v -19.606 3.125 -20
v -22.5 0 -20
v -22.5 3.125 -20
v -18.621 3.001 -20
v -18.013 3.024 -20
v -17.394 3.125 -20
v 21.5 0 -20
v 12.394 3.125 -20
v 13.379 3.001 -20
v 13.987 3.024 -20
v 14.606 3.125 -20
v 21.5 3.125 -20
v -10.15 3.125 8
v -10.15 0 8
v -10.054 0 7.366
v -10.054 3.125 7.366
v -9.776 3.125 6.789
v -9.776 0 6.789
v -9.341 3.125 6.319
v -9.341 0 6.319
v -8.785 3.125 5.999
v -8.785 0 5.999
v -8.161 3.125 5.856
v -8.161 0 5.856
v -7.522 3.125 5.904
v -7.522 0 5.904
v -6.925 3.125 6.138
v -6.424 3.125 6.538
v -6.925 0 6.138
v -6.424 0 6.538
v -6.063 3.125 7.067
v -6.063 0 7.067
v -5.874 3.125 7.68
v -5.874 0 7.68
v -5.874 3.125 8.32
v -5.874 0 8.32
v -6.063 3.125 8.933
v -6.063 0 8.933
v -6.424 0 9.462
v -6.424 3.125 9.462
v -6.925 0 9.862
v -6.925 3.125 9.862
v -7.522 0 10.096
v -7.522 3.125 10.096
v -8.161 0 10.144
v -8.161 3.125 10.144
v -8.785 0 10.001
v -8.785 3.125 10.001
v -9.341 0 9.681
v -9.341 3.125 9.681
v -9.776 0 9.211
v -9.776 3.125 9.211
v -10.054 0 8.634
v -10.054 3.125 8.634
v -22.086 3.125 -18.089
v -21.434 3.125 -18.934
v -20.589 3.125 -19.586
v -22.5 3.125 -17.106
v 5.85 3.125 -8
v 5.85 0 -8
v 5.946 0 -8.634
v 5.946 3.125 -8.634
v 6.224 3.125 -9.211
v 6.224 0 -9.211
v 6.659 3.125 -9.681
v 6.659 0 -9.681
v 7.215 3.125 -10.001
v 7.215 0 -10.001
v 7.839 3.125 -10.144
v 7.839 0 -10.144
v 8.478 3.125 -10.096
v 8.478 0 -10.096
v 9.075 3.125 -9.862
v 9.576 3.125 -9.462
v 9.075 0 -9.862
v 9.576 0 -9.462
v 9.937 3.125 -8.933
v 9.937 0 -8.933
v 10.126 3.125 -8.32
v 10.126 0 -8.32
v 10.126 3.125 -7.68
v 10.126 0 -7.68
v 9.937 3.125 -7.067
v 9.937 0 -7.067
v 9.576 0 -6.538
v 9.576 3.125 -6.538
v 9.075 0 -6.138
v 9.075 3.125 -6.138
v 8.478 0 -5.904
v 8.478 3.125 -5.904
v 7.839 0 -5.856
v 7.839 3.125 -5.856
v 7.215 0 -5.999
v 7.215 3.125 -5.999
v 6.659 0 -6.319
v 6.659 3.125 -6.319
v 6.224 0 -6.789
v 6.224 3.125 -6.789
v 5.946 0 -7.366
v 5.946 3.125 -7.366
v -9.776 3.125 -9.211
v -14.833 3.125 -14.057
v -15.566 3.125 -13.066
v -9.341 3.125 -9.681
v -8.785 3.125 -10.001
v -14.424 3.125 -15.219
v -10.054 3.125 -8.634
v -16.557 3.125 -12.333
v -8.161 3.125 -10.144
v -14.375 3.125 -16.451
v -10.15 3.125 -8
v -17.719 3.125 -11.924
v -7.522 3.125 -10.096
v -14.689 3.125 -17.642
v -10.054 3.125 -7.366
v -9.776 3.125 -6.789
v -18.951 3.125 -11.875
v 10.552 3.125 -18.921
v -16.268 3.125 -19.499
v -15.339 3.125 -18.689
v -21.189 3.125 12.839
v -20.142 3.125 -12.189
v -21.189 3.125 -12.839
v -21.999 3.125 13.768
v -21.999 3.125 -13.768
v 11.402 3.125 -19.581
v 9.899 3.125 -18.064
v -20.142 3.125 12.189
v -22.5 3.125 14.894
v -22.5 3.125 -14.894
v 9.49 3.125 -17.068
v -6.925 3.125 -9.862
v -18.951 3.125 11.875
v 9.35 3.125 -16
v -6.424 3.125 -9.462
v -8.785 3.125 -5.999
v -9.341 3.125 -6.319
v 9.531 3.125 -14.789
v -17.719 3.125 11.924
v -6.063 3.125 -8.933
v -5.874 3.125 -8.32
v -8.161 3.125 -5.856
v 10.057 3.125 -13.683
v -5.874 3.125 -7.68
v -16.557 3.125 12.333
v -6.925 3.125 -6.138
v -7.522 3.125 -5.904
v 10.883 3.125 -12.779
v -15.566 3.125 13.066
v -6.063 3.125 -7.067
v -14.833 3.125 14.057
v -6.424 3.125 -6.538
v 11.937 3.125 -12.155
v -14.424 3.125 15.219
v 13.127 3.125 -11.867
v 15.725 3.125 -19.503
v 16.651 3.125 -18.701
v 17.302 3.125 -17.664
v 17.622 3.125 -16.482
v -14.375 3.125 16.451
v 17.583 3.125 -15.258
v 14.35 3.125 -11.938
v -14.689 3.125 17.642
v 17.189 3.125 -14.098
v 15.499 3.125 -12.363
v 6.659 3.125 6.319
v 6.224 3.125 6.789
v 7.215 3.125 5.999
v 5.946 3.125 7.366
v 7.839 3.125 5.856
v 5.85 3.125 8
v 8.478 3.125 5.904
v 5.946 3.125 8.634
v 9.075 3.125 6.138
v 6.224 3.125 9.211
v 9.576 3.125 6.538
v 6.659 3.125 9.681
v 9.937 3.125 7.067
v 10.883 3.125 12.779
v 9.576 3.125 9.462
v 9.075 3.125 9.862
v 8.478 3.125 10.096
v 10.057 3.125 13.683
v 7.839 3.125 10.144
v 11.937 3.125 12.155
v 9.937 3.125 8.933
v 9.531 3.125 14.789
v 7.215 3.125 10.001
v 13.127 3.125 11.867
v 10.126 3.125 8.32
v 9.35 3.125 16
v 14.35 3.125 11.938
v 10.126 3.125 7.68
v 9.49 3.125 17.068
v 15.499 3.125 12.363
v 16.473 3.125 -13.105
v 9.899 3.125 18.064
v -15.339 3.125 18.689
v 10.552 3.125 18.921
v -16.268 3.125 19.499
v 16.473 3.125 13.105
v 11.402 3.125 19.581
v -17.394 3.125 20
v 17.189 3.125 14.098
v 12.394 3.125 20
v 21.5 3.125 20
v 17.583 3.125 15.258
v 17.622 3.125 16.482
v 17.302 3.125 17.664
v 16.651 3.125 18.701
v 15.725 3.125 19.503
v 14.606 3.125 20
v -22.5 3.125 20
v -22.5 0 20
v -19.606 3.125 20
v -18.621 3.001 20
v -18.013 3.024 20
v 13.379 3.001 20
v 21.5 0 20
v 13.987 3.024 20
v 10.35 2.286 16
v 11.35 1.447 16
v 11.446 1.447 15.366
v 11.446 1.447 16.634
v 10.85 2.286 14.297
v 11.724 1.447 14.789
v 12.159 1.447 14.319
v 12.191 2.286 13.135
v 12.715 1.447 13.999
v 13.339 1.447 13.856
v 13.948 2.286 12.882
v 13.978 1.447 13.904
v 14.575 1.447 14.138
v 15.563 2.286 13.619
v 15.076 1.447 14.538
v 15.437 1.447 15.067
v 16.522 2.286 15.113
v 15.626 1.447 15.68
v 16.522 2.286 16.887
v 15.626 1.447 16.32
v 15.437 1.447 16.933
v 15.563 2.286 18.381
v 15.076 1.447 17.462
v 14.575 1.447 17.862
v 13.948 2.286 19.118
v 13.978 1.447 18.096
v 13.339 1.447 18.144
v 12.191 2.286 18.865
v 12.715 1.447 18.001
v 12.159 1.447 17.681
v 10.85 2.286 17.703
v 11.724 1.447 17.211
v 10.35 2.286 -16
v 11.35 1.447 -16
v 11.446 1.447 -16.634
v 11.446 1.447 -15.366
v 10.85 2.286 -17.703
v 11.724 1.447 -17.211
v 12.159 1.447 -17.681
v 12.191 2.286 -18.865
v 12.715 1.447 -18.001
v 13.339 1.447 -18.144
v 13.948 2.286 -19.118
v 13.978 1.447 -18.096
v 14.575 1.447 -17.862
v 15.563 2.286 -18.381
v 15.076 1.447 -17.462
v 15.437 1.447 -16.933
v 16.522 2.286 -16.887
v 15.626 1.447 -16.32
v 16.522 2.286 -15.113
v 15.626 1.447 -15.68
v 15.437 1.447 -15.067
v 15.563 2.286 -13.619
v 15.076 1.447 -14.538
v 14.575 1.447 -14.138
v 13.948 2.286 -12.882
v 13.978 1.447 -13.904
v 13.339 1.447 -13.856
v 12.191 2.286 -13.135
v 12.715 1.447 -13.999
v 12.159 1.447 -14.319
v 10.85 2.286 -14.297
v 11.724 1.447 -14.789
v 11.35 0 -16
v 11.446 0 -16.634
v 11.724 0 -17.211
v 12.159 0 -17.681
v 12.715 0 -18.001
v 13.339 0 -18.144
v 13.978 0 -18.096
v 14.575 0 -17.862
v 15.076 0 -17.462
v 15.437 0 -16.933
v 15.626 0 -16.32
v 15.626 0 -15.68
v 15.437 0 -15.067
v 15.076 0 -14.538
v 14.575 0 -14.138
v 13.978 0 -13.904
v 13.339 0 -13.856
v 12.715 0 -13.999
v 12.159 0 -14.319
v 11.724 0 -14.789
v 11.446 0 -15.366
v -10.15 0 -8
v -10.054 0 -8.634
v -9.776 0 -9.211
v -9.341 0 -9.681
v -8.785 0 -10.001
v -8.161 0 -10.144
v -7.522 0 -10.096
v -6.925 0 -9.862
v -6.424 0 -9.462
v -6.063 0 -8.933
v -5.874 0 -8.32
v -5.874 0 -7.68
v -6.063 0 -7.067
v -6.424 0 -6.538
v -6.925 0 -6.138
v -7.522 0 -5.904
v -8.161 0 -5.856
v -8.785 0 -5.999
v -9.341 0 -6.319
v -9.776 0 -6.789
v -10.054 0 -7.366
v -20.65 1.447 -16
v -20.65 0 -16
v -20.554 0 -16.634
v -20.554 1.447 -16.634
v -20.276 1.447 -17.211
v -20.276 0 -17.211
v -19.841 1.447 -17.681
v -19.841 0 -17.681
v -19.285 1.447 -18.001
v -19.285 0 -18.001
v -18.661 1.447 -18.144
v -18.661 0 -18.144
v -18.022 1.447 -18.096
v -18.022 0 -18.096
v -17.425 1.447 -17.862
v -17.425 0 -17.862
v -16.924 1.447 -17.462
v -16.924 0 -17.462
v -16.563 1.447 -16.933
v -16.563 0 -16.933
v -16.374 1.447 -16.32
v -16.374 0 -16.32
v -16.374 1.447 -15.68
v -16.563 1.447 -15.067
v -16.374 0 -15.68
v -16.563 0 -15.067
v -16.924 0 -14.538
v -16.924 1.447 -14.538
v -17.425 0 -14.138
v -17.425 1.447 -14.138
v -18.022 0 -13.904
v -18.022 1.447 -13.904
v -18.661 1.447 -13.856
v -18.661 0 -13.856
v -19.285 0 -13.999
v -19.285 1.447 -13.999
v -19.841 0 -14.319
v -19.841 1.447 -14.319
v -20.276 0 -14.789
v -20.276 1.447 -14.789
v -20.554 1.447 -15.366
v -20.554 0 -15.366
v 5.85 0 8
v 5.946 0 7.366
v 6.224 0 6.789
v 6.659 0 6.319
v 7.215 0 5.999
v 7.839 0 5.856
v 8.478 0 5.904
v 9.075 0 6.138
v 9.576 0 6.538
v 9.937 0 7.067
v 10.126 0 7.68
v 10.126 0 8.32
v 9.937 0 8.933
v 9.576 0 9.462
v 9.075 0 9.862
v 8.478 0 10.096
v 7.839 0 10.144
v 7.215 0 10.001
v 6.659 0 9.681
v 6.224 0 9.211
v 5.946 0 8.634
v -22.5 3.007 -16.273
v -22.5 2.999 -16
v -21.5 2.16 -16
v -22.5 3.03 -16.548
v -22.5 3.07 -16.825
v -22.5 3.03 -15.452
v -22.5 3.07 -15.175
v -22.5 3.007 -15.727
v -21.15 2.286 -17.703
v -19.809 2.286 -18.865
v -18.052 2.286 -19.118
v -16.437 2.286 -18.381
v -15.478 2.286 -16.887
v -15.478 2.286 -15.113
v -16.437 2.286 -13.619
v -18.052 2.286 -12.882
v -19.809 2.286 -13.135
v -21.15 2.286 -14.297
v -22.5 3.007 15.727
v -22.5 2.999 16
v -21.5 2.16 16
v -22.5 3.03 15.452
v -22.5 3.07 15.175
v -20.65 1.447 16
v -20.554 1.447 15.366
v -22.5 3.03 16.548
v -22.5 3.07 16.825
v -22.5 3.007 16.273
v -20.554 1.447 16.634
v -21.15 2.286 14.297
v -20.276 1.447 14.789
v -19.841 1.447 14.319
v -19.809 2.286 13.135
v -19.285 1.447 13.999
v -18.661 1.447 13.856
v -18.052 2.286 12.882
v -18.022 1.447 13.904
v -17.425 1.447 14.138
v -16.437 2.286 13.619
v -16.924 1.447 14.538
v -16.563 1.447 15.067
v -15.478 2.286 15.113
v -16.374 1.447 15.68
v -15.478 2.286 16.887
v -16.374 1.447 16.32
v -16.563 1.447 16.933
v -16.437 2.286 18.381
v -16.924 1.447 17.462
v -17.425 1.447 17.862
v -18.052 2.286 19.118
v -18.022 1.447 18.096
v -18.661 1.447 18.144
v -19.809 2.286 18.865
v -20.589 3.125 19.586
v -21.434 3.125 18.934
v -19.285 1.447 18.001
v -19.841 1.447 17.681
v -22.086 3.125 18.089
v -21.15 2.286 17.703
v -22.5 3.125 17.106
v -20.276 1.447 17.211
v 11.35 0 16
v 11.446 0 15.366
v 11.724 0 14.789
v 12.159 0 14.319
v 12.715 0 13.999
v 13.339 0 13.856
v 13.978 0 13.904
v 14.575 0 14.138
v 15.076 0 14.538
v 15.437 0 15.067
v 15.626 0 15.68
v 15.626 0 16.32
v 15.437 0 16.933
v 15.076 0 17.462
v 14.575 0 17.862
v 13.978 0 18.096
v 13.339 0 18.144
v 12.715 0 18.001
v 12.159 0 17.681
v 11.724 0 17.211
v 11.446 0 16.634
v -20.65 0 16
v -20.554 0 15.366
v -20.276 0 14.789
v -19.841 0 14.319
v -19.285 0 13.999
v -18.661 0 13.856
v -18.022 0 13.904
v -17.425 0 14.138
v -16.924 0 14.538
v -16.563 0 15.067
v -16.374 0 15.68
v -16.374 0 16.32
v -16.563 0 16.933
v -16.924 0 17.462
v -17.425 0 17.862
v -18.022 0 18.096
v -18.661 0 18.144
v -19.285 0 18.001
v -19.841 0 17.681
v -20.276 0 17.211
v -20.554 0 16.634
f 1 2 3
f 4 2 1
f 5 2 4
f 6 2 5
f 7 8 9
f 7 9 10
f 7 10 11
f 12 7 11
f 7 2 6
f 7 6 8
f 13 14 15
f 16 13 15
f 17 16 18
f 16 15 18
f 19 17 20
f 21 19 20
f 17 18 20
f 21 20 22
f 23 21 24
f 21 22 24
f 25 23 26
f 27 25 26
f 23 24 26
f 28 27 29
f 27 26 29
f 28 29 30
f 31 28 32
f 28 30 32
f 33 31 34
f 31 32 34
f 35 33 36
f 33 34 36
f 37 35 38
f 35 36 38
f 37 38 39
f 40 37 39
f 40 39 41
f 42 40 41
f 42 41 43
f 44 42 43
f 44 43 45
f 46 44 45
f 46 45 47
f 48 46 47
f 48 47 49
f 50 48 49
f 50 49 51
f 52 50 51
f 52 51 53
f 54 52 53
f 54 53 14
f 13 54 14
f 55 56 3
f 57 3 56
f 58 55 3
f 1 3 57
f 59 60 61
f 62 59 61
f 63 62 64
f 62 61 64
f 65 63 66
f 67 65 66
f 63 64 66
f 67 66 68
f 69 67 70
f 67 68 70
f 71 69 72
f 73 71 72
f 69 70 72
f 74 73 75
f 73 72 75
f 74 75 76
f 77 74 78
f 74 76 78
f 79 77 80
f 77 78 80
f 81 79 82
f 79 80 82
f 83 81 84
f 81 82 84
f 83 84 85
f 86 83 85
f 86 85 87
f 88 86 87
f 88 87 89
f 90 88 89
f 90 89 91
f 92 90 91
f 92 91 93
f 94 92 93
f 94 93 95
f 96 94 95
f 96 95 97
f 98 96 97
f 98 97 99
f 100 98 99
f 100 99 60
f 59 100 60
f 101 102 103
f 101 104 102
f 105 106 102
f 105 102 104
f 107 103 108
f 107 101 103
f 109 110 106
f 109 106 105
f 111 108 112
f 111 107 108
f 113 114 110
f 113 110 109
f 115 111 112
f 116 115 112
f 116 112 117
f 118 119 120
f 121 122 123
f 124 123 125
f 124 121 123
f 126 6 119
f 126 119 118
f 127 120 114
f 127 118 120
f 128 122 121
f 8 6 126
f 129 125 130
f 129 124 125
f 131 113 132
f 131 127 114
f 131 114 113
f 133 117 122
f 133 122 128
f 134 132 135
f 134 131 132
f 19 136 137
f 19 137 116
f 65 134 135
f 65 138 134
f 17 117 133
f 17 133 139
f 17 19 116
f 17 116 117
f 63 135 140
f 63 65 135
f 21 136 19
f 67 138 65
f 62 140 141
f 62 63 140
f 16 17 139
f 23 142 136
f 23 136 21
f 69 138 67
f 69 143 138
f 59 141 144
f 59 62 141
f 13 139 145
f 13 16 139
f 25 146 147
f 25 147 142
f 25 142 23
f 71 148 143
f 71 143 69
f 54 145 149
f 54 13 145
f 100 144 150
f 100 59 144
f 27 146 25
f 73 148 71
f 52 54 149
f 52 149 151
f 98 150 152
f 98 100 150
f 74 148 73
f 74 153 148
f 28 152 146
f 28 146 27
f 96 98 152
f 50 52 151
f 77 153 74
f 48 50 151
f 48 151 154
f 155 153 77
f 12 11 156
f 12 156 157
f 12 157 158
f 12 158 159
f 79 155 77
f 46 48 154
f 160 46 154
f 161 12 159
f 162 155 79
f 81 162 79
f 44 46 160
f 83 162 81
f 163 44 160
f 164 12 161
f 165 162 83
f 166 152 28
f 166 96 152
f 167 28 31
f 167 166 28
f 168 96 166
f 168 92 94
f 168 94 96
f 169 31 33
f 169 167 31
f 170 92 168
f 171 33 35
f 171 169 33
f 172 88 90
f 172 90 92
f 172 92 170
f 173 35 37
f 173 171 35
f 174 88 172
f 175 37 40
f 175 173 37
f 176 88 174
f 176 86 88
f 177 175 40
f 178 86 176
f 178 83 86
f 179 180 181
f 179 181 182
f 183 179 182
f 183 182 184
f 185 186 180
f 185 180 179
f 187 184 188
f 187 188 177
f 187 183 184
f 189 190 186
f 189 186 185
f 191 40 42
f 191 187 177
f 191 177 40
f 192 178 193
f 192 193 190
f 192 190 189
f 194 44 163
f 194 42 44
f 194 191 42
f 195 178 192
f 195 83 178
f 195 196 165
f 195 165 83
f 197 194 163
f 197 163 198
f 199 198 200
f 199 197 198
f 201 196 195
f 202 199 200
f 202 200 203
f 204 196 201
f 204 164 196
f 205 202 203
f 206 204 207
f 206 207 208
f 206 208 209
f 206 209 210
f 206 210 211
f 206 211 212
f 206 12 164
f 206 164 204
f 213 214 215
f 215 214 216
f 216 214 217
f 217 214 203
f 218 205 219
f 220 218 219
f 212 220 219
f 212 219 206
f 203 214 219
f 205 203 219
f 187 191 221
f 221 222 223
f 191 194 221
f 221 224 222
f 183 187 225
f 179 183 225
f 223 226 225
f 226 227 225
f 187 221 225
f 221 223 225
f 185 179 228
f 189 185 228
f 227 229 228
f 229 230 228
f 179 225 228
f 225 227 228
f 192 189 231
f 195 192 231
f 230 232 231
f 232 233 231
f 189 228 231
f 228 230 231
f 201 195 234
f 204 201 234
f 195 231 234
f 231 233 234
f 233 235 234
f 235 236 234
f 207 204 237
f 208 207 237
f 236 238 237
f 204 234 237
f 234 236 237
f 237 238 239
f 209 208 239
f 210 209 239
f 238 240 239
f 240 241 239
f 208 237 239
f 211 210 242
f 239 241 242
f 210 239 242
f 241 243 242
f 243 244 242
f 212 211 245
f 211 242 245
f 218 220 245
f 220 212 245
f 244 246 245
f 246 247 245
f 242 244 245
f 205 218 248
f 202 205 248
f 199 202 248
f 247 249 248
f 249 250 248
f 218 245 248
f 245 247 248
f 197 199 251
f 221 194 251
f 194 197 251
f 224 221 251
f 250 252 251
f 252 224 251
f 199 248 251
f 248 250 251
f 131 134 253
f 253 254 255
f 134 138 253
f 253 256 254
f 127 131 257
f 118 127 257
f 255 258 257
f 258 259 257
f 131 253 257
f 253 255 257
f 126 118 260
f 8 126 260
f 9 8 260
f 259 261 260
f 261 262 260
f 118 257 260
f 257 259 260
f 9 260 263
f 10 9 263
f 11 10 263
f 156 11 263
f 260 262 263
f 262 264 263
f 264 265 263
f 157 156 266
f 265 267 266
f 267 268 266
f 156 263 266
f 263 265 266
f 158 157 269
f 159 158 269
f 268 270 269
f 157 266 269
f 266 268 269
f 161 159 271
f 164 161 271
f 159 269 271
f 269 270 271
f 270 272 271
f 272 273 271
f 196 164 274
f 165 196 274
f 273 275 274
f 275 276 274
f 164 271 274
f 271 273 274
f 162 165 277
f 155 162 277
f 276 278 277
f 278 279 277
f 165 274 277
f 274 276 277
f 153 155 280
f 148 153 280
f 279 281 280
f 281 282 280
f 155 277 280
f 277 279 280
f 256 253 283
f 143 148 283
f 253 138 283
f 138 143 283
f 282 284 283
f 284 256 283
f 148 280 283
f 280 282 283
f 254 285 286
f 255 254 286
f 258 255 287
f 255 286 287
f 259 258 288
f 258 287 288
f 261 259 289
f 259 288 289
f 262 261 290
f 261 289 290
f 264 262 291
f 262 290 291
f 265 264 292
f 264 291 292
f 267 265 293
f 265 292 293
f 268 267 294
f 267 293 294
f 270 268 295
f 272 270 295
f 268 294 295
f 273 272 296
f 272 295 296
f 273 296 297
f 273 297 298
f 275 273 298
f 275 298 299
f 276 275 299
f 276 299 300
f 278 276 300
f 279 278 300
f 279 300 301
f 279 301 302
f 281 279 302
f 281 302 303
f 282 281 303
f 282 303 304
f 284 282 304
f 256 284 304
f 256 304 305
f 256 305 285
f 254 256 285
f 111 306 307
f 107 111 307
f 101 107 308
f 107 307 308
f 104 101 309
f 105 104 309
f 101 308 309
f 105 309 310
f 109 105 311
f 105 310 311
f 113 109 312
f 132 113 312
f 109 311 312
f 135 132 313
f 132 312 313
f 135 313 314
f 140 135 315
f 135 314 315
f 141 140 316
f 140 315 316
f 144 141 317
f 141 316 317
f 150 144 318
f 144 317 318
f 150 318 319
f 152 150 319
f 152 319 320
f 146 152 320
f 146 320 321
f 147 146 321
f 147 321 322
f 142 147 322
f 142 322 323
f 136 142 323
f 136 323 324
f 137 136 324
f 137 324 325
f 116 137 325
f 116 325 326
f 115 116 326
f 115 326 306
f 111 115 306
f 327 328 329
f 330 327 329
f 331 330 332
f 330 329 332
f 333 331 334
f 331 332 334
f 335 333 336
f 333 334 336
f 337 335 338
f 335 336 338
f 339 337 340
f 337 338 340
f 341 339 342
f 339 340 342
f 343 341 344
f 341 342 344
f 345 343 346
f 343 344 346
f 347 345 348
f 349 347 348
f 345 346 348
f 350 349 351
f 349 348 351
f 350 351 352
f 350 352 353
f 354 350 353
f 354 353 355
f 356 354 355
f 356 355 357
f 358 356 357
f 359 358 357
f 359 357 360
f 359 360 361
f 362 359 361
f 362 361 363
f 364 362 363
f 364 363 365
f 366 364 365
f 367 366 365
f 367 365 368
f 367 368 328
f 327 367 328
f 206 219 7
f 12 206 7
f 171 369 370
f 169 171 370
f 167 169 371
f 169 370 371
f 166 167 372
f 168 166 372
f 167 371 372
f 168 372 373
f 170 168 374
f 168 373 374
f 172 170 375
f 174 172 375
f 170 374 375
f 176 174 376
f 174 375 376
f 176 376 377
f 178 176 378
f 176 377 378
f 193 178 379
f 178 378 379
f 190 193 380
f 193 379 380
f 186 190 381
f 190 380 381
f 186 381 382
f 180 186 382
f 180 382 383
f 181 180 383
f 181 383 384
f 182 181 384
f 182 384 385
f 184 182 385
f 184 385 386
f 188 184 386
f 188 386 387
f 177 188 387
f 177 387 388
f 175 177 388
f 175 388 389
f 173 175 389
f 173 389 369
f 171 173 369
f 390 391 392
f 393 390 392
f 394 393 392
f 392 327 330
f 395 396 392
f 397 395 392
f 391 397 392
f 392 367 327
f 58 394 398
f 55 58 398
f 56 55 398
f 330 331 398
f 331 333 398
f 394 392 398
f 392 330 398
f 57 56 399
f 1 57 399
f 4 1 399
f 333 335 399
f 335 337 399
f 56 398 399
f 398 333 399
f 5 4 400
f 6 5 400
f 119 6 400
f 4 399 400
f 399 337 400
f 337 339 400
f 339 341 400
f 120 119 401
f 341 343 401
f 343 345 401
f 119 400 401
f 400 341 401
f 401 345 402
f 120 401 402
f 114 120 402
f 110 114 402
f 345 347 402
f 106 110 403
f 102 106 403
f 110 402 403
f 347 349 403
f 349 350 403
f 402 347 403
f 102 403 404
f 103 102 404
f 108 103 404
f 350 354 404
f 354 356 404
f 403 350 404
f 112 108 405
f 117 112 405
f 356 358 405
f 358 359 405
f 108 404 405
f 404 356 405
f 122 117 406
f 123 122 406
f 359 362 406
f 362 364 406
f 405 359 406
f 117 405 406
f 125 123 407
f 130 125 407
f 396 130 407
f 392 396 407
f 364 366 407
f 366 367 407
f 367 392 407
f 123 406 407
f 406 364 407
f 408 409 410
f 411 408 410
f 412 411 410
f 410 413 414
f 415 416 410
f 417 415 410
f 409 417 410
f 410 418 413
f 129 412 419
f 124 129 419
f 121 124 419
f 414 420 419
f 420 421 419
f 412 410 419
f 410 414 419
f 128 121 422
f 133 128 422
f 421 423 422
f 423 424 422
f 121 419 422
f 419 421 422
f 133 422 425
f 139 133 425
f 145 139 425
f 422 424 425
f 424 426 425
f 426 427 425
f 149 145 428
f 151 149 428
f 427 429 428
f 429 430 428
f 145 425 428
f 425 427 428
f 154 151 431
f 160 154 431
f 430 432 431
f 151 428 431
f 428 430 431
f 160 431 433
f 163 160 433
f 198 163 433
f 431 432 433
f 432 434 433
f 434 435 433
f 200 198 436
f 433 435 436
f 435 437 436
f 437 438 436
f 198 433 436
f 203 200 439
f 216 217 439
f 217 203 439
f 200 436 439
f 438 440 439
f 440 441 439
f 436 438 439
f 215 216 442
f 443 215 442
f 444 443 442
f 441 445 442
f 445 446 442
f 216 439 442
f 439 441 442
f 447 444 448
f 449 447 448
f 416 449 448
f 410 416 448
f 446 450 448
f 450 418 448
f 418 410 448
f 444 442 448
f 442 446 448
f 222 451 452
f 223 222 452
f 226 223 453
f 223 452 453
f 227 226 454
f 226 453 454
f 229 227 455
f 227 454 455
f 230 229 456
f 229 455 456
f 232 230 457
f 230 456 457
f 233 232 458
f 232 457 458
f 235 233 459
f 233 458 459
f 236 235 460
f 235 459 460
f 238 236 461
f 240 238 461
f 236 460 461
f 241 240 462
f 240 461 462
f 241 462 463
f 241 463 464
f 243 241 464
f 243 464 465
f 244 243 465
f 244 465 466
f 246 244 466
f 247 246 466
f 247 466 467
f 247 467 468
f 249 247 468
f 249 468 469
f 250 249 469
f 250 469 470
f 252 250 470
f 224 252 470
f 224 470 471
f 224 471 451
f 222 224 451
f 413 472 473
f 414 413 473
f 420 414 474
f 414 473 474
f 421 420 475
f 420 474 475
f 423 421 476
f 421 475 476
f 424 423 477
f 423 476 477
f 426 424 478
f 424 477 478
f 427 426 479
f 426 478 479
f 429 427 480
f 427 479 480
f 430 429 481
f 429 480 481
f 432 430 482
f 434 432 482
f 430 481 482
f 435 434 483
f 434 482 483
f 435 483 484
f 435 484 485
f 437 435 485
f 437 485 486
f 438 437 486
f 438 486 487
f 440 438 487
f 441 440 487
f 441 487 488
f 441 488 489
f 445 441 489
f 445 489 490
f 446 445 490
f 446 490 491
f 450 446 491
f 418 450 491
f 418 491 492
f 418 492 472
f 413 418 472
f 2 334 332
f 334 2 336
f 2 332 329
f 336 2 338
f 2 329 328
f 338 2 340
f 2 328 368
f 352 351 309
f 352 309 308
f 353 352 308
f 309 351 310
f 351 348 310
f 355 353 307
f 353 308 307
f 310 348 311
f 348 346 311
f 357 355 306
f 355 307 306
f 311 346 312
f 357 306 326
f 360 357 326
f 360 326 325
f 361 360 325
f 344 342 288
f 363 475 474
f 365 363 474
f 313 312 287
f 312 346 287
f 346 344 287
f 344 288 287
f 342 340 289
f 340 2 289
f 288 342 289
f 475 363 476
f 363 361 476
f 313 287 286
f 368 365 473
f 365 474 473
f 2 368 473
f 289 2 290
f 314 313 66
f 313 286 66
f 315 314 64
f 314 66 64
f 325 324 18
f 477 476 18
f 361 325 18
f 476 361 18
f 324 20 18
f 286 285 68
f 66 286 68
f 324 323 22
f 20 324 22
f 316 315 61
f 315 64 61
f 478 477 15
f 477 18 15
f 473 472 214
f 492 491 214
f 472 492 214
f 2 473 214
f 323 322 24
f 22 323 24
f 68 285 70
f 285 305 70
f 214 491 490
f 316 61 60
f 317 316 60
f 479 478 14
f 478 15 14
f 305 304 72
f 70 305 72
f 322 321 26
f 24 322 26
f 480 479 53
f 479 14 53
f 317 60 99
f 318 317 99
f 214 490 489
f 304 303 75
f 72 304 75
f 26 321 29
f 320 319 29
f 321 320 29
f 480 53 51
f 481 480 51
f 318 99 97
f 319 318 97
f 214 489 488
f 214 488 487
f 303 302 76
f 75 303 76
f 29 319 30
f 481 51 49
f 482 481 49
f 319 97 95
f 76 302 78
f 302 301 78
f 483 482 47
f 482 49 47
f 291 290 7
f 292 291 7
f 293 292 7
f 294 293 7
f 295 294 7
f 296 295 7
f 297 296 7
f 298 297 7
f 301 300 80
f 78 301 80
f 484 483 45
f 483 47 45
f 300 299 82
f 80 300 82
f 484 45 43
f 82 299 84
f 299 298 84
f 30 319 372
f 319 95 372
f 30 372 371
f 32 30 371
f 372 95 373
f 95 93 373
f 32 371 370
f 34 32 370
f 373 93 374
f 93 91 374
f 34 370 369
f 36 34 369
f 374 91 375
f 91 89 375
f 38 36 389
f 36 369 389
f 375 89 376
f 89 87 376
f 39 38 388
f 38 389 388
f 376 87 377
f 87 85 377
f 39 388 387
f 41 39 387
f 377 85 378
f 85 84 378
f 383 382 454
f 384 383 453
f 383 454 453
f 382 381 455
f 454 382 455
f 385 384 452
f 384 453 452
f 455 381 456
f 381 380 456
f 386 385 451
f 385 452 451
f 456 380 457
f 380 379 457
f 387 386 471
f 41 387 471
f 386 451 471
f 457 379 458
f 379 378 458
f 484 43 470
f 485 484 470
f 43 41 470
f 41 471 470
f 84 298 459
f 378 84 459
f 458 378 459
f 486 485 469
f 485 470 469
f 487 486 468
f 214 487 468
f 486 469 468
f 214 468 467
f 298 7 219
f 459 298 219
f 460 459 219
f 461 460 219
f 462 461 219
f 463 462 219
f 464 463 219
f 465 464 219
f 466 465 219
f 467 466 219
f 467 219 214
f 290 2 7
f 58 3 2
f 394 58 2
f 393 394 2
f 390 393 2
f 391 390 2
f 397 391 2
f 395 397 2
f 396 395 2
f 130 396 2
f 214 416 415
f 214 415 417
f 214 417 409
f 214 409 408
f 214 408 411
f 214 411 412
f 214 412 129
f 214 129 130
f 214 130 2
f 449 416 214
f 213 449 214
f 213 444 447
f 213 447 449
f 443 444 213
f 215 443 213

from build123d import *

# Parameters (mm, degrees)
SKETCH1_W            = 43
SKETCH1_H            = 40
BOSS_EXTRUDE1_DEPTH  = 3.125
M4_CLEARANCE_HOLE1_D = 4.3
M4_CLEARANCE_HOLE2_D = 4.3
SKETCH7_W            = 40
SKETCH7_H            = 3.125
BOSS_EXTRUDE2_DEPTH  = 1
CHAMFER1_SIZE        = 2
CHAMFER1_SIZE_2      = 1.678199262


with BuildPart() as part:
    # Sketch1 → Boss-Extrude1 (new body)
    with BuildSketch(Plane(origin=(0, 0, 0), x_dir=(1, 0, 0), z_dir=(0, 1, 0))):
        Rectangle(SKETCH1_W, SKETCH1_H)
    extrude(amount=BOSS_EXTRUDE1_DEPTH)

    # M4 Clearance Hole1 (through all)
    with Locations(Plane(origin=(0, 3.125, 0), x_dir=(1, 0, 0), z_dir=(0, 1, 0))):
        with Locations((-18.5, 16), (13.5, 16), (13.5, -16), (-18.5, -16)):
            Hole(M4_CLEARANCE_HOLE1_D / 2)

    # M4 Clearance Hole2 (through all)
    with Locations(Plane(origin=(0, 3.125, 0), x_dir=(1, 0, 0), z_dir=(0, 1, 0))):
        with Locations((-8, 8), (8, 8), (8, -8), (-8, -8)):
            Hole(M4_CLEARANCE_HOLE2_D / 2)

    # Sketch7 → Boss-Extrude2 (add)
    with BuildSketch(Plane.ZY.offset(21.5)):
        with Locations((0, 1.5625)):
            Rectangle(SKETCH7_W, SKETCH7_H)
    extrude(amount=BOSS_EXTRUDE2_DEPTH)

    # Chamfer1
    # the kernel refuses this chamfer: 2, 1.678199262 mm, written as the material it takes off along each edge
    with BuildSketch(Plane(origin=(-18.5, 3.125, 16), x_dir=(-1, 0, 0), z_dir=(0, 0, 1))) as chamfer1_piece_1:
        Polygon((2.15 + CHAMFER1_SIZE, 0), (2.15, CHAMFER1_SIZE_2), (2.15, 0), align=None)
    revolve(axis=Axis((-18.5, 3.125, 16), (0, -1, 0)), mode=Mode.SUBTRACT)
    with BuildSketch(Plane(origin=(13.5, 3.125, 16), x_dir=(-1, 0, 0), z_dir=(0, 0, 1))) as chamfer1_piece_2:
        Polygon((2.15 + CHAMFER1_SIZE, 0), (2.15, CHAMFER1_SIZE_2), (2.15, 0), align=None)
    revolve(axis=Axis((13.5, 3.125, 16), (0, -1, 0)), mode=Mode.SUBTRACT)
    with BuildSketch(Plane(origin=(13.5, 3.125, -16), x_dir=(-1, 0, 0), z_dir=(0, 0, 1))) as chamfer1_piece_3:
        Polygon((2.15 + CHAMFER1_SIZE, 0), (2.15, CHAMFER1_SIZE_2), (2.15, 0), align=None)
    revolve(axis=Axis((13.5, 3.125, -16), (0, -1, 0)), mode=Mode.SUBTRACT)
    with BuildSketch(Plane(origin=(-18.5, 3.125, -16), x_dir=(-1, 0, 0), z_dir=(0, 0, 1))) as chamfer1_piece_4:
        Polygon((2.15 + CHAMFER1_SIZE, 0), (2.15, CHAMFER1_SIZE_2), (2.15, 0), align=None)
    revolve(axis=Axis((-18.5, 3.125, -16), (0, -1, 0)), mode=Mode.SUBTRACT)


solid = part.part
